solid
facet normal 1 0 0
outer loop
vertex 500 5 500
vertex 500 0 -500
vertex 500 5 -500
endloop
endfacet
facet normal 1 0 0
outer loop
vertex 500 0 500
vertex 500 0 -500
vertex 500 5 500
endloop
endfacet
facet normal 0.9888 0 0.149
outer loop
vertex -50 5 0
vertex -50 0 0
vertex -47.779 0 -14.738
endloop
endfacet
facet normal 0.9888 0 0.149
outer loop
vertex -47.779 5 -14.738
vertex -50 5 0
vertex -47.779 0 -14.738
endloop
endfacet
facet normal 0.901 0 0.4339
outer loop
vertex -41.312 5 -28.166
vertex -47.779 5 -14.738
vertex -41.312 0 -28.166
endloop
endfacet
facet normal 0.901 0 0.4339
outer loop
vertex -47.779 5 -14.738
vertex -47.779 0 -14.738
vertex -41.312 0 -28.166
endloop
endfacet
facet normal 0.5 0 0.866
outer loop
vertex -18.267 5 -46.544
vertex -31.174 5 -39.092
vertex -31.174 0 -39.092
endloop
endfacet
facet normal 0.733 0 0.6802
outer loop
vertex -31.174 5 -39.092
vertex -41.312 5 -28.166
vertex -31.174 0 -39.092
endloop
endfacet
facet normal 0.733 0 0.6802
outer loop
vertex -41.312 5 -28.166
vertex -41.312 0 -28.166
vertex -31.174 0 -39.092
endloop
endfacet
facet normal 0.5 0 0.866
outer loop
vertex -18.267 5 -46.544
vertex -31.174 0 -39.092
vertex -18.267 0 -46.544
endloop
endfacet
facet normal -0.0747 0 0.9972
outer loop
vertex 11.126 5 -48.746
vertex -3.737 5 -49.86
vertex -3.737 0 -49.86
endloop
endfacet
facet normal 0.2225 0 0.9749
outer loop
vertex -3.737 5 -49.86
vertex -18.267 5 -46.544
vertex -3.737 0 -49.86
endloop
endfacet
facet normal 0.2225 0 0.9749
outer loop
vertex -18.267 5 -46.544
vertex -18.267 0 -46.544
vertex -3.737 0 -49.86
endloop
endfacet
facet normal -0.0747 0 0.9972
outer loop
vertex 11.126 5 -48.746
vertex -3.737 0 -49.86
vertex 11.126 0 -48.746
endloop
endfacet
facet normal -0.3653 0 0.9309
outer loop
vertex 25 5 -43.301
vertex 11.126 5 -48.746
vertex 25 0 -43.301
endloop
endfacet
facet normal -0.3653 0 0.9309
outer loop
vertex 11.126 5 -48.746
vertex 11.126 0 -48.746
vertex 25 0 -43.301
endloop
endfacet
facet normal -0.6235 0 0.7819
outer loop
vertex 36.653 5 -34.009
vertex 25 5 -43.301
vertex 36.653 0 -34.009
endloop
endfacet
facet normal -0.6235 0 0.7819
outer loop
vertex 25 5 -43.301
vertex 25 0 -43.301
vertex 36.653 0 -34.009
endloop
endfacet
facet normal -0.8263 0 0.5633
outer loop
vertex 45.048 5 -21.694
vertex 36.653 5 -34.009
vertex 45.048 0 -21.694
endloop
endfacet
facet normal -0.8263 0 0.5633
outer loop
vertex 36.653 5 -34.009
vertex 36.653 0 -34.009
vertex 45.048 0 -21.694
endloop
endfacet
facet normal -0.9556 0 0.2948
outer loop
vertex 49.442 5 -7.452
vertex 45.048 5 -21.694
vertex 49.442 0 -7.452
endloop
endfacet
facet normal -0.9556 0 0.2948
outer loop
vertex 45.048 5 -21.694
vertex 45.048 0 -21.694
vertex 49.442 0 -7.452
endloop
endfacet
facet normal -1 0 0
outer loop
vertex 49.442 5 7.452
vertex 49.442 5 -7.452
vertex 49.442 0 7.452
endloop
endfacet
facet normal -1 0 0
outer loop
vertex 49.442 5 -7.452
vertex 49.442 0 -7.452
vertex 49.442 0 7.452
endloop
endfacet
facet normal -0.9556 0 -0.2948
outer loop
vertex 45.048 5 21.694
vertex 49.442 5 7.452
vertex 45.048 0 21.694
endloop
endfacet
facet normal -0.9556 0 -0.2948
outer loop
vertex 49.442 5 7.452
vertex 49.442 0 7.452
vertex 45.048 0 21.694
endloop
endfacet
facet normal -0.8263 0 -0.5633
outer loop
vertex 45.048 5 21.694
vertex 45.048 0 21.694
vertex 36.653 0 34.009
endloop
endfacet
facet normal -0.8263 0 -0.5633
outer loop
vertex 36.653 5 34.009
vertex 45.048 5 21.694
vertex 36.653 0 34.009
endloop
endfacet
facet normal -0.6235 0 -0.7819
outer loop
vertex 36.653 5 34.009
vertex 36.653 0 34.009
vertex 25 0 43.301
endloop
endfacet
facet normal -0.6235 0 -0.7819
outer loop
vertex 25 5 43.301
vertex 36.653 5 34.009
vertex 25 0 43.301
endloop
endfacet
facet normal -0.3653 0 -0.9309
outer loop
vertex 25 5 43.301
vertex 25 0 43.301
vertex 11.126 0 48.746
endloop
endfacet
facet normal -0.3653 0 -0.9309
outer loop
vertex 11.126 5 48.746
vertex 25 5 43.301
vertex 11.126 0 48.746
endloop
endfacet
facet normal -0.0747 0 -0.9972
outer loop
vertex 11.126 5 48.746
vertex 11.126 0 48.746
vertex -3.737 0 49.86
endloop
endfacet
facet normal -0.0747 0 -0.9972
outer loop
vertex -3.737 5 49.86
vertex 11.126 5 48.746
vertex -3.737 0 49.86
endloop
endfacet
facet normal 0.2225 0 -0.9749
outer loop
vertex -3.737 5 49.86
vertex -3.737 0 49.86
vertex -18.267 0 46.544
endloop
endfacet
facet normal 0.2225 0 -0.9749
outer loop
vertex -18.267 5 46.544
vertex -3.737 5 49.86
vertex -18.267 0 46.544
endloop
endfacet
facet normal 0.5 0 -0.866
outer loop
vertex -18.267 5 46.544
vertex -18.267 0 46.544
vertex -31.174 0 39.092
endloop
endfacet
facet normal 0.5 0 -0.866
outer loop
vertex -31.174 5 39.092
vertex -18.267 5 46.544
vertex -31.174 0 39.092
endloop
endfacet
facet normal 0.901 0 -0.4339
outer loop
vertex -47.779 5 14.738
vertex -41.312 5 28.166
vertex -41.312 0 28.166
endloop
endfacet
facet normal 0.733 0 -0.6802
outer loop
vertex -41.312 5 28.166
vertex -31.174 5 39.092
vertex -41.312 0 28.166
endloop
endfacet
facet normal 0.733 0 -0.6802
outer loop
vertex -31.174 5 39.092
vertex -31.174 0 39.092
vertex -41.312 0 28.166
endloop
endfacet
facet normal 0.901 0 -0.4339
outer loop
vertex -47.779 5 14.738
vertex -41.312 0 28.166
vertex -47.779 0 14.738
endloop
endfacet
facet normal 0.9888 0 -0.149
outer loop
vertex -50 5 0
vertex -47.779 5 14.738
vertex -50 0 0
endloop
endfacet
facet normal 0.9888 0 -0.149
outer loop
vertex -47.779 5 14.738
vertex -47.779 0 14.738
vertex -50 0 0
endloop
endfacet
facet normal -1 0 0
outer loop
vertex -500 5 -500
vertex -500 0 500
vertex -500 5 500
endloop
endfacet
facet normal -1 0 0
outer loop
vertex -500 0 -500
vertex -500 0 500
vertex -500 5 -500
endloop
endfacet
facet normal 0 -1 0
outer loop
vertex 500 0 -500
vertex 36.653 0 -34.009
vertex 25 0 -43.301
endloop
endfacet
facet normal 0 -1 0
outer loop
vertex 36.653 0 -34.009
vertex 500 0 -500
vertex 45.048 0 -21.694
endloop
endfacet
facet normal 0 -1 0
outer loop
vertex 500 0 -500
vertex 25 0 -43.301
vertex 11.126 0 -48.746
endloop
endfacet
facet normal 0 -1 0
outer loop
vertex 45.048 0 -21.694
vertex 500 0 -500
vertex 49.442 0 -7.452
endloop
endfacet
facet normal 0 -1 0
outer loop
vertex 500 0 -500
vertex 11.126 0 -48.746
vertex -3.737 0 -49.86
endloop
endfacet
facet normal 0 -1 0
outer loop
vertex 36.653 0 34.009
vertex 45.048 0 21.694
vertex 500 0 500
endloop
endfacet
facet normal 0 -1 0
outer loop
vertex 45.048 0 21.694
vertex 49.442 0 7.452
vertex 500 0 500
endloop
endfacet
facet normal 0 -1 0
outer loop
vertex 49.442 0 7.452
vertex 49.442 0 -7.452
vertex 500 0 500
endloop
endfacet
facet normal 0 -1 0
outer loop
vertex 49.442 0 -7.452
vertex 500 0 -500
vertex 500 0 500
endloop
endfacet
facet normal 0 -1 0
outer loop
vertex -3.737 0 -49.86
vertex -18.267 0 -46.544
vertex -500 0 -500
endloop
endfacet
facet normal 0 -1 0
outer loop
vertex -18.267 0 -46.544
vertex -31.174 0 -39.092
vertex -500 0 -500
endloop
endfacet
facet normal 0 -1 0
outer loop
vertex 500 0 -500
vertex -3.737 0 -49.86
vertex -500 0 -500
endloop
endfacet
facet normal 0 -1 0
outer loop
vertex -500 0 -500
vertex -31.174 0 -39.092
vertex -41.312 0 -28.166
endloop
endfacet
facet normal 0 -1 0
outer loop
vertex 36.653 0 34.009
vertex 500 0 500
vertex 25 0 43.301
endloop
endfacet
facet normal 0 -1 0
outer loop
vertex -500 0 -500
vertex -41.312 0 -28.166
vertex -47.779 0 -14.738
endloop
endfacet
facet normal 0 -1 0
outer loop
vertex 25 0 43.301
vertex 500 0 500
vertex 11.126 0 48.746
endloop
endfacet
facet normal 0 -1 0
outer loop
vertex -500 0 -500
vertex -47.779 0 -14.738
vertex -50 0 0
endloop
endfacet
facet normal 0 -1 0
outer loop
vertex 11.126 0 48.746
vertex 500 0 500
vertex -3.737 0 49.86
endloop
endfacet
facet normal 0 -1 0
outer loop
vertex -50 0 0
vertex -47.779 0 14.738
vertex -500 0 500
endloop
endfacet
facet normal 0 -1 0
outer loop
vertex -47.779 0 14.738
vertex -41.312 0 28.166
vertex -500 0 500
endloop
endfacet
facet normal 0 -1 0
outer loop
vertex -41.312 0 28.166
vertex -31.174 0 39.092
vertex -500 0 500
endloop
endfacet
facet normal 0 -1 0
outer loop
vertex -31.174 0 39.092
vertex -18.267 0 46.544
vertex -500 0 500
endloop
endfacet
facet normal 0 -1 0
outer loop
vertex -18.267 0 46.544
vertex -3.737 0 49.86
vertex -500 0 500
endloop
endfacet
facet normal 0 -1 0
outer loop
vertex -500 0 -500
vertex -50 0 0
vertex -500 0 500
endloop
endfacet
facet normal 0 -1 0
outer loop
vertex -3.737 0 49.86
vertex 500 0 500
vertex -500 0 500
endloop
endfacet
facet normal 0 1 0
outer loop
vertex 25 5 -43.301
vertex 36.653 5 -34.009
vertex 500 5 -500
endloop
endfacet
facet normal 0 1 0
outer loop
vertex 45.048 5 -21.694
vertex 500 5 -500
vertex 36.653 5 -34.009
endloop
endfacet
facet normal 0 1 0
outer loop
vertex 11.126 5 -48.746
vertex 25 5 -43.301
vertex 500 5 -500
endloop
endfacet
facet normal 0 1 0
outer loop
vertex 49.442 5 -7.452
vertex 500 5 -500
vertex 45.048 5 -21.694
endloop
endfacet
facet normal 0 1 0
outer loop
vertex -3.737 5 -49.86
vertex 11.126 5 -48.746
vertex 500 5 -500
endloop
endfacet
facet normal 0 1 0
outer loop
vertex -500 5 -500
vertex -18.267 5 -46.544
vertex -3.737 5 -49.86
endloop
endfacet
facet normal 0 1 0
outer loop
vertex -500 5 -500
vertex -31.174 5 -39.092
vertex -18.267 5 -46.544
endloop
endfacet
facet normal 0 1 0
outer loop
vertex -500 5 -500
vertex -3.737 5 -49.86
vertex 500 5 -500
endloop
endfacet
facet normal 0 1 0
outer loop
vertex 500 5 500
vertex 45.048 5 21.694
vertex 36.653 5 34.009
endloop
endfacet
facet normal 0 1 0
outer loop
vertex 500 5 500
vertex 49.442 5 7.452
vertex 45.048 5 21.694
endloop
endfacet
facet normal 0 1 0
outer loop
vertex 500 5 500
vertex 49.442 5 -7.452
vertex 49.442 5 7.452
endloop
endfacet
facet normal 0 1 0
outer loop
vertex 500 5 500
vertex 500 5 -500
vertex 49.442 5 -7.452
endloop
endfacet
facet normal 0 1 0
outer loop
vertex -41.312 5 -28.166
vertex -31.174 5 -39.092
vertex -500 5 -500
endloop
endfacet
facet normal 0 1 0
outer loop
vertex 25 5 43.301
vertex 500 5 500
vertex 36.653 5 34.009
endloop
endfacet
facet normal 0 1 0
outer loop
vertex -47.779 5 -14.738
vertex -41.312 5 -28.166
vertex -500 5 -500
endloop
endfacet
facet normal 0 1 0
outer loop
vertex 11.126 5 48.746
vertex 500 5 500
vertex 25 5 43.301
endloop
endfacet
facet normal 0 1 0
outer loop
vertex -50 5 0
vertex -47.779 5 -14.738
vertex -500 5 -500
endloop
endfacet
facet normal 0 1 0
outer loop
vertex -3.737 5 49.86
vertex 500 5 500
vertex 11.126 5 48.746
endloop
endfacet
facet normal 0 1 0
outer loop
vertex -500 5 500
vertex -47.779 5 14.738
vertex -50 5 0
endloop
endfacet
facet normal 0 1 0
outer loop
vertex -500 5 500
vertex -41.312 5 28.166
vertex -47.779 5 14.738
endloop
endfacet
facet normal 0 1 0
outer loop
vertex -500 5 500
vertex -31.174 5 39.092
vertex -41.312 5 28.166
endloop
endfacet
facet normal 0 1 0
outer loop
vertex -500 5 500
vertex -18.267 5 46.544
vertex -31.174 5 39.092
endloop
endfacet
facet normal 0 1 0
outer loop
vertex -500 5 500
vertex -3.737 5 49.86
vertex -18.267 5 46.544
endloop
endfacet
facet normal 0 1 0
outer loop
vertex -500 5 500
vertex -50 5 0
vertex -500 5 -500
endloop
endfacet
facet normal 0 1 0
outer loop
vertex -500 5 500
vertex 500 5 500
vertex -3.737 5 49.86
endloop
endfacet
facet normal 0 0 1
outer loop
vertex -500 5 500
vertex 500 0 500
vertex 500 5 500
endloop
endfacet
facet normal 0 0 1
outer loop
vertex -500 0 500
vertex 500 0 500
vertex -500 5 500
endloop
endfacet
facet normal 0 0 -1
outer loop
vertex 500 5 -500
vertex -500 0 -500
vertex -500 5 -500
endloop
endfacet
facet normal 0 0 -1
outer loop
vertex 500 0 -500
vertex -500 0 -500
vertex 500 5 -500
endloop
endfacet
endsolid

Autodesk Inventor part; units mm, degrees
ref_plane "YZ Plane" through (0, 0, 0) normal (1, 0, 0) x (0, 1, 0)
ref_plane "XZ Plane" through (0, 0, 0) normal (0, 1, 0) x (-1, 0, 0)
ref_plane "XY Plane" through (0, 0, 0) normal (0, 0, 1) x (1, 0, 0)
sketch "Sketch1" plane through (0, 0, 0) normal (0, 1, 0) x (-1, 0, 0)
  circle A0 centre (0, 0) radius 438.1 construction
  line L0 (500, -500) -> (-500, -500)
  line L1 (-500, -500) -> (-500, 500)
  line L2 (-500, 500) -> (500, 500)
  line L3 (500, 500) -> (500, -500)
  line L4 (0, -248.7708) -> (0, 248.7708) construction
  line L5 (-1768.3221, 0) -> (1768.3221, 0) construction
  circle A1 centre (0, 0) radius 50
  dimension "d0" = 876.2
  dimension "d1" = 1000
  dimension "d2" = 1000
  dimension "d5" = 100
extrude "Extrusion1" add sketch "Sketch1" along normal blind 5
properties part number "StatorGroundPlate"
